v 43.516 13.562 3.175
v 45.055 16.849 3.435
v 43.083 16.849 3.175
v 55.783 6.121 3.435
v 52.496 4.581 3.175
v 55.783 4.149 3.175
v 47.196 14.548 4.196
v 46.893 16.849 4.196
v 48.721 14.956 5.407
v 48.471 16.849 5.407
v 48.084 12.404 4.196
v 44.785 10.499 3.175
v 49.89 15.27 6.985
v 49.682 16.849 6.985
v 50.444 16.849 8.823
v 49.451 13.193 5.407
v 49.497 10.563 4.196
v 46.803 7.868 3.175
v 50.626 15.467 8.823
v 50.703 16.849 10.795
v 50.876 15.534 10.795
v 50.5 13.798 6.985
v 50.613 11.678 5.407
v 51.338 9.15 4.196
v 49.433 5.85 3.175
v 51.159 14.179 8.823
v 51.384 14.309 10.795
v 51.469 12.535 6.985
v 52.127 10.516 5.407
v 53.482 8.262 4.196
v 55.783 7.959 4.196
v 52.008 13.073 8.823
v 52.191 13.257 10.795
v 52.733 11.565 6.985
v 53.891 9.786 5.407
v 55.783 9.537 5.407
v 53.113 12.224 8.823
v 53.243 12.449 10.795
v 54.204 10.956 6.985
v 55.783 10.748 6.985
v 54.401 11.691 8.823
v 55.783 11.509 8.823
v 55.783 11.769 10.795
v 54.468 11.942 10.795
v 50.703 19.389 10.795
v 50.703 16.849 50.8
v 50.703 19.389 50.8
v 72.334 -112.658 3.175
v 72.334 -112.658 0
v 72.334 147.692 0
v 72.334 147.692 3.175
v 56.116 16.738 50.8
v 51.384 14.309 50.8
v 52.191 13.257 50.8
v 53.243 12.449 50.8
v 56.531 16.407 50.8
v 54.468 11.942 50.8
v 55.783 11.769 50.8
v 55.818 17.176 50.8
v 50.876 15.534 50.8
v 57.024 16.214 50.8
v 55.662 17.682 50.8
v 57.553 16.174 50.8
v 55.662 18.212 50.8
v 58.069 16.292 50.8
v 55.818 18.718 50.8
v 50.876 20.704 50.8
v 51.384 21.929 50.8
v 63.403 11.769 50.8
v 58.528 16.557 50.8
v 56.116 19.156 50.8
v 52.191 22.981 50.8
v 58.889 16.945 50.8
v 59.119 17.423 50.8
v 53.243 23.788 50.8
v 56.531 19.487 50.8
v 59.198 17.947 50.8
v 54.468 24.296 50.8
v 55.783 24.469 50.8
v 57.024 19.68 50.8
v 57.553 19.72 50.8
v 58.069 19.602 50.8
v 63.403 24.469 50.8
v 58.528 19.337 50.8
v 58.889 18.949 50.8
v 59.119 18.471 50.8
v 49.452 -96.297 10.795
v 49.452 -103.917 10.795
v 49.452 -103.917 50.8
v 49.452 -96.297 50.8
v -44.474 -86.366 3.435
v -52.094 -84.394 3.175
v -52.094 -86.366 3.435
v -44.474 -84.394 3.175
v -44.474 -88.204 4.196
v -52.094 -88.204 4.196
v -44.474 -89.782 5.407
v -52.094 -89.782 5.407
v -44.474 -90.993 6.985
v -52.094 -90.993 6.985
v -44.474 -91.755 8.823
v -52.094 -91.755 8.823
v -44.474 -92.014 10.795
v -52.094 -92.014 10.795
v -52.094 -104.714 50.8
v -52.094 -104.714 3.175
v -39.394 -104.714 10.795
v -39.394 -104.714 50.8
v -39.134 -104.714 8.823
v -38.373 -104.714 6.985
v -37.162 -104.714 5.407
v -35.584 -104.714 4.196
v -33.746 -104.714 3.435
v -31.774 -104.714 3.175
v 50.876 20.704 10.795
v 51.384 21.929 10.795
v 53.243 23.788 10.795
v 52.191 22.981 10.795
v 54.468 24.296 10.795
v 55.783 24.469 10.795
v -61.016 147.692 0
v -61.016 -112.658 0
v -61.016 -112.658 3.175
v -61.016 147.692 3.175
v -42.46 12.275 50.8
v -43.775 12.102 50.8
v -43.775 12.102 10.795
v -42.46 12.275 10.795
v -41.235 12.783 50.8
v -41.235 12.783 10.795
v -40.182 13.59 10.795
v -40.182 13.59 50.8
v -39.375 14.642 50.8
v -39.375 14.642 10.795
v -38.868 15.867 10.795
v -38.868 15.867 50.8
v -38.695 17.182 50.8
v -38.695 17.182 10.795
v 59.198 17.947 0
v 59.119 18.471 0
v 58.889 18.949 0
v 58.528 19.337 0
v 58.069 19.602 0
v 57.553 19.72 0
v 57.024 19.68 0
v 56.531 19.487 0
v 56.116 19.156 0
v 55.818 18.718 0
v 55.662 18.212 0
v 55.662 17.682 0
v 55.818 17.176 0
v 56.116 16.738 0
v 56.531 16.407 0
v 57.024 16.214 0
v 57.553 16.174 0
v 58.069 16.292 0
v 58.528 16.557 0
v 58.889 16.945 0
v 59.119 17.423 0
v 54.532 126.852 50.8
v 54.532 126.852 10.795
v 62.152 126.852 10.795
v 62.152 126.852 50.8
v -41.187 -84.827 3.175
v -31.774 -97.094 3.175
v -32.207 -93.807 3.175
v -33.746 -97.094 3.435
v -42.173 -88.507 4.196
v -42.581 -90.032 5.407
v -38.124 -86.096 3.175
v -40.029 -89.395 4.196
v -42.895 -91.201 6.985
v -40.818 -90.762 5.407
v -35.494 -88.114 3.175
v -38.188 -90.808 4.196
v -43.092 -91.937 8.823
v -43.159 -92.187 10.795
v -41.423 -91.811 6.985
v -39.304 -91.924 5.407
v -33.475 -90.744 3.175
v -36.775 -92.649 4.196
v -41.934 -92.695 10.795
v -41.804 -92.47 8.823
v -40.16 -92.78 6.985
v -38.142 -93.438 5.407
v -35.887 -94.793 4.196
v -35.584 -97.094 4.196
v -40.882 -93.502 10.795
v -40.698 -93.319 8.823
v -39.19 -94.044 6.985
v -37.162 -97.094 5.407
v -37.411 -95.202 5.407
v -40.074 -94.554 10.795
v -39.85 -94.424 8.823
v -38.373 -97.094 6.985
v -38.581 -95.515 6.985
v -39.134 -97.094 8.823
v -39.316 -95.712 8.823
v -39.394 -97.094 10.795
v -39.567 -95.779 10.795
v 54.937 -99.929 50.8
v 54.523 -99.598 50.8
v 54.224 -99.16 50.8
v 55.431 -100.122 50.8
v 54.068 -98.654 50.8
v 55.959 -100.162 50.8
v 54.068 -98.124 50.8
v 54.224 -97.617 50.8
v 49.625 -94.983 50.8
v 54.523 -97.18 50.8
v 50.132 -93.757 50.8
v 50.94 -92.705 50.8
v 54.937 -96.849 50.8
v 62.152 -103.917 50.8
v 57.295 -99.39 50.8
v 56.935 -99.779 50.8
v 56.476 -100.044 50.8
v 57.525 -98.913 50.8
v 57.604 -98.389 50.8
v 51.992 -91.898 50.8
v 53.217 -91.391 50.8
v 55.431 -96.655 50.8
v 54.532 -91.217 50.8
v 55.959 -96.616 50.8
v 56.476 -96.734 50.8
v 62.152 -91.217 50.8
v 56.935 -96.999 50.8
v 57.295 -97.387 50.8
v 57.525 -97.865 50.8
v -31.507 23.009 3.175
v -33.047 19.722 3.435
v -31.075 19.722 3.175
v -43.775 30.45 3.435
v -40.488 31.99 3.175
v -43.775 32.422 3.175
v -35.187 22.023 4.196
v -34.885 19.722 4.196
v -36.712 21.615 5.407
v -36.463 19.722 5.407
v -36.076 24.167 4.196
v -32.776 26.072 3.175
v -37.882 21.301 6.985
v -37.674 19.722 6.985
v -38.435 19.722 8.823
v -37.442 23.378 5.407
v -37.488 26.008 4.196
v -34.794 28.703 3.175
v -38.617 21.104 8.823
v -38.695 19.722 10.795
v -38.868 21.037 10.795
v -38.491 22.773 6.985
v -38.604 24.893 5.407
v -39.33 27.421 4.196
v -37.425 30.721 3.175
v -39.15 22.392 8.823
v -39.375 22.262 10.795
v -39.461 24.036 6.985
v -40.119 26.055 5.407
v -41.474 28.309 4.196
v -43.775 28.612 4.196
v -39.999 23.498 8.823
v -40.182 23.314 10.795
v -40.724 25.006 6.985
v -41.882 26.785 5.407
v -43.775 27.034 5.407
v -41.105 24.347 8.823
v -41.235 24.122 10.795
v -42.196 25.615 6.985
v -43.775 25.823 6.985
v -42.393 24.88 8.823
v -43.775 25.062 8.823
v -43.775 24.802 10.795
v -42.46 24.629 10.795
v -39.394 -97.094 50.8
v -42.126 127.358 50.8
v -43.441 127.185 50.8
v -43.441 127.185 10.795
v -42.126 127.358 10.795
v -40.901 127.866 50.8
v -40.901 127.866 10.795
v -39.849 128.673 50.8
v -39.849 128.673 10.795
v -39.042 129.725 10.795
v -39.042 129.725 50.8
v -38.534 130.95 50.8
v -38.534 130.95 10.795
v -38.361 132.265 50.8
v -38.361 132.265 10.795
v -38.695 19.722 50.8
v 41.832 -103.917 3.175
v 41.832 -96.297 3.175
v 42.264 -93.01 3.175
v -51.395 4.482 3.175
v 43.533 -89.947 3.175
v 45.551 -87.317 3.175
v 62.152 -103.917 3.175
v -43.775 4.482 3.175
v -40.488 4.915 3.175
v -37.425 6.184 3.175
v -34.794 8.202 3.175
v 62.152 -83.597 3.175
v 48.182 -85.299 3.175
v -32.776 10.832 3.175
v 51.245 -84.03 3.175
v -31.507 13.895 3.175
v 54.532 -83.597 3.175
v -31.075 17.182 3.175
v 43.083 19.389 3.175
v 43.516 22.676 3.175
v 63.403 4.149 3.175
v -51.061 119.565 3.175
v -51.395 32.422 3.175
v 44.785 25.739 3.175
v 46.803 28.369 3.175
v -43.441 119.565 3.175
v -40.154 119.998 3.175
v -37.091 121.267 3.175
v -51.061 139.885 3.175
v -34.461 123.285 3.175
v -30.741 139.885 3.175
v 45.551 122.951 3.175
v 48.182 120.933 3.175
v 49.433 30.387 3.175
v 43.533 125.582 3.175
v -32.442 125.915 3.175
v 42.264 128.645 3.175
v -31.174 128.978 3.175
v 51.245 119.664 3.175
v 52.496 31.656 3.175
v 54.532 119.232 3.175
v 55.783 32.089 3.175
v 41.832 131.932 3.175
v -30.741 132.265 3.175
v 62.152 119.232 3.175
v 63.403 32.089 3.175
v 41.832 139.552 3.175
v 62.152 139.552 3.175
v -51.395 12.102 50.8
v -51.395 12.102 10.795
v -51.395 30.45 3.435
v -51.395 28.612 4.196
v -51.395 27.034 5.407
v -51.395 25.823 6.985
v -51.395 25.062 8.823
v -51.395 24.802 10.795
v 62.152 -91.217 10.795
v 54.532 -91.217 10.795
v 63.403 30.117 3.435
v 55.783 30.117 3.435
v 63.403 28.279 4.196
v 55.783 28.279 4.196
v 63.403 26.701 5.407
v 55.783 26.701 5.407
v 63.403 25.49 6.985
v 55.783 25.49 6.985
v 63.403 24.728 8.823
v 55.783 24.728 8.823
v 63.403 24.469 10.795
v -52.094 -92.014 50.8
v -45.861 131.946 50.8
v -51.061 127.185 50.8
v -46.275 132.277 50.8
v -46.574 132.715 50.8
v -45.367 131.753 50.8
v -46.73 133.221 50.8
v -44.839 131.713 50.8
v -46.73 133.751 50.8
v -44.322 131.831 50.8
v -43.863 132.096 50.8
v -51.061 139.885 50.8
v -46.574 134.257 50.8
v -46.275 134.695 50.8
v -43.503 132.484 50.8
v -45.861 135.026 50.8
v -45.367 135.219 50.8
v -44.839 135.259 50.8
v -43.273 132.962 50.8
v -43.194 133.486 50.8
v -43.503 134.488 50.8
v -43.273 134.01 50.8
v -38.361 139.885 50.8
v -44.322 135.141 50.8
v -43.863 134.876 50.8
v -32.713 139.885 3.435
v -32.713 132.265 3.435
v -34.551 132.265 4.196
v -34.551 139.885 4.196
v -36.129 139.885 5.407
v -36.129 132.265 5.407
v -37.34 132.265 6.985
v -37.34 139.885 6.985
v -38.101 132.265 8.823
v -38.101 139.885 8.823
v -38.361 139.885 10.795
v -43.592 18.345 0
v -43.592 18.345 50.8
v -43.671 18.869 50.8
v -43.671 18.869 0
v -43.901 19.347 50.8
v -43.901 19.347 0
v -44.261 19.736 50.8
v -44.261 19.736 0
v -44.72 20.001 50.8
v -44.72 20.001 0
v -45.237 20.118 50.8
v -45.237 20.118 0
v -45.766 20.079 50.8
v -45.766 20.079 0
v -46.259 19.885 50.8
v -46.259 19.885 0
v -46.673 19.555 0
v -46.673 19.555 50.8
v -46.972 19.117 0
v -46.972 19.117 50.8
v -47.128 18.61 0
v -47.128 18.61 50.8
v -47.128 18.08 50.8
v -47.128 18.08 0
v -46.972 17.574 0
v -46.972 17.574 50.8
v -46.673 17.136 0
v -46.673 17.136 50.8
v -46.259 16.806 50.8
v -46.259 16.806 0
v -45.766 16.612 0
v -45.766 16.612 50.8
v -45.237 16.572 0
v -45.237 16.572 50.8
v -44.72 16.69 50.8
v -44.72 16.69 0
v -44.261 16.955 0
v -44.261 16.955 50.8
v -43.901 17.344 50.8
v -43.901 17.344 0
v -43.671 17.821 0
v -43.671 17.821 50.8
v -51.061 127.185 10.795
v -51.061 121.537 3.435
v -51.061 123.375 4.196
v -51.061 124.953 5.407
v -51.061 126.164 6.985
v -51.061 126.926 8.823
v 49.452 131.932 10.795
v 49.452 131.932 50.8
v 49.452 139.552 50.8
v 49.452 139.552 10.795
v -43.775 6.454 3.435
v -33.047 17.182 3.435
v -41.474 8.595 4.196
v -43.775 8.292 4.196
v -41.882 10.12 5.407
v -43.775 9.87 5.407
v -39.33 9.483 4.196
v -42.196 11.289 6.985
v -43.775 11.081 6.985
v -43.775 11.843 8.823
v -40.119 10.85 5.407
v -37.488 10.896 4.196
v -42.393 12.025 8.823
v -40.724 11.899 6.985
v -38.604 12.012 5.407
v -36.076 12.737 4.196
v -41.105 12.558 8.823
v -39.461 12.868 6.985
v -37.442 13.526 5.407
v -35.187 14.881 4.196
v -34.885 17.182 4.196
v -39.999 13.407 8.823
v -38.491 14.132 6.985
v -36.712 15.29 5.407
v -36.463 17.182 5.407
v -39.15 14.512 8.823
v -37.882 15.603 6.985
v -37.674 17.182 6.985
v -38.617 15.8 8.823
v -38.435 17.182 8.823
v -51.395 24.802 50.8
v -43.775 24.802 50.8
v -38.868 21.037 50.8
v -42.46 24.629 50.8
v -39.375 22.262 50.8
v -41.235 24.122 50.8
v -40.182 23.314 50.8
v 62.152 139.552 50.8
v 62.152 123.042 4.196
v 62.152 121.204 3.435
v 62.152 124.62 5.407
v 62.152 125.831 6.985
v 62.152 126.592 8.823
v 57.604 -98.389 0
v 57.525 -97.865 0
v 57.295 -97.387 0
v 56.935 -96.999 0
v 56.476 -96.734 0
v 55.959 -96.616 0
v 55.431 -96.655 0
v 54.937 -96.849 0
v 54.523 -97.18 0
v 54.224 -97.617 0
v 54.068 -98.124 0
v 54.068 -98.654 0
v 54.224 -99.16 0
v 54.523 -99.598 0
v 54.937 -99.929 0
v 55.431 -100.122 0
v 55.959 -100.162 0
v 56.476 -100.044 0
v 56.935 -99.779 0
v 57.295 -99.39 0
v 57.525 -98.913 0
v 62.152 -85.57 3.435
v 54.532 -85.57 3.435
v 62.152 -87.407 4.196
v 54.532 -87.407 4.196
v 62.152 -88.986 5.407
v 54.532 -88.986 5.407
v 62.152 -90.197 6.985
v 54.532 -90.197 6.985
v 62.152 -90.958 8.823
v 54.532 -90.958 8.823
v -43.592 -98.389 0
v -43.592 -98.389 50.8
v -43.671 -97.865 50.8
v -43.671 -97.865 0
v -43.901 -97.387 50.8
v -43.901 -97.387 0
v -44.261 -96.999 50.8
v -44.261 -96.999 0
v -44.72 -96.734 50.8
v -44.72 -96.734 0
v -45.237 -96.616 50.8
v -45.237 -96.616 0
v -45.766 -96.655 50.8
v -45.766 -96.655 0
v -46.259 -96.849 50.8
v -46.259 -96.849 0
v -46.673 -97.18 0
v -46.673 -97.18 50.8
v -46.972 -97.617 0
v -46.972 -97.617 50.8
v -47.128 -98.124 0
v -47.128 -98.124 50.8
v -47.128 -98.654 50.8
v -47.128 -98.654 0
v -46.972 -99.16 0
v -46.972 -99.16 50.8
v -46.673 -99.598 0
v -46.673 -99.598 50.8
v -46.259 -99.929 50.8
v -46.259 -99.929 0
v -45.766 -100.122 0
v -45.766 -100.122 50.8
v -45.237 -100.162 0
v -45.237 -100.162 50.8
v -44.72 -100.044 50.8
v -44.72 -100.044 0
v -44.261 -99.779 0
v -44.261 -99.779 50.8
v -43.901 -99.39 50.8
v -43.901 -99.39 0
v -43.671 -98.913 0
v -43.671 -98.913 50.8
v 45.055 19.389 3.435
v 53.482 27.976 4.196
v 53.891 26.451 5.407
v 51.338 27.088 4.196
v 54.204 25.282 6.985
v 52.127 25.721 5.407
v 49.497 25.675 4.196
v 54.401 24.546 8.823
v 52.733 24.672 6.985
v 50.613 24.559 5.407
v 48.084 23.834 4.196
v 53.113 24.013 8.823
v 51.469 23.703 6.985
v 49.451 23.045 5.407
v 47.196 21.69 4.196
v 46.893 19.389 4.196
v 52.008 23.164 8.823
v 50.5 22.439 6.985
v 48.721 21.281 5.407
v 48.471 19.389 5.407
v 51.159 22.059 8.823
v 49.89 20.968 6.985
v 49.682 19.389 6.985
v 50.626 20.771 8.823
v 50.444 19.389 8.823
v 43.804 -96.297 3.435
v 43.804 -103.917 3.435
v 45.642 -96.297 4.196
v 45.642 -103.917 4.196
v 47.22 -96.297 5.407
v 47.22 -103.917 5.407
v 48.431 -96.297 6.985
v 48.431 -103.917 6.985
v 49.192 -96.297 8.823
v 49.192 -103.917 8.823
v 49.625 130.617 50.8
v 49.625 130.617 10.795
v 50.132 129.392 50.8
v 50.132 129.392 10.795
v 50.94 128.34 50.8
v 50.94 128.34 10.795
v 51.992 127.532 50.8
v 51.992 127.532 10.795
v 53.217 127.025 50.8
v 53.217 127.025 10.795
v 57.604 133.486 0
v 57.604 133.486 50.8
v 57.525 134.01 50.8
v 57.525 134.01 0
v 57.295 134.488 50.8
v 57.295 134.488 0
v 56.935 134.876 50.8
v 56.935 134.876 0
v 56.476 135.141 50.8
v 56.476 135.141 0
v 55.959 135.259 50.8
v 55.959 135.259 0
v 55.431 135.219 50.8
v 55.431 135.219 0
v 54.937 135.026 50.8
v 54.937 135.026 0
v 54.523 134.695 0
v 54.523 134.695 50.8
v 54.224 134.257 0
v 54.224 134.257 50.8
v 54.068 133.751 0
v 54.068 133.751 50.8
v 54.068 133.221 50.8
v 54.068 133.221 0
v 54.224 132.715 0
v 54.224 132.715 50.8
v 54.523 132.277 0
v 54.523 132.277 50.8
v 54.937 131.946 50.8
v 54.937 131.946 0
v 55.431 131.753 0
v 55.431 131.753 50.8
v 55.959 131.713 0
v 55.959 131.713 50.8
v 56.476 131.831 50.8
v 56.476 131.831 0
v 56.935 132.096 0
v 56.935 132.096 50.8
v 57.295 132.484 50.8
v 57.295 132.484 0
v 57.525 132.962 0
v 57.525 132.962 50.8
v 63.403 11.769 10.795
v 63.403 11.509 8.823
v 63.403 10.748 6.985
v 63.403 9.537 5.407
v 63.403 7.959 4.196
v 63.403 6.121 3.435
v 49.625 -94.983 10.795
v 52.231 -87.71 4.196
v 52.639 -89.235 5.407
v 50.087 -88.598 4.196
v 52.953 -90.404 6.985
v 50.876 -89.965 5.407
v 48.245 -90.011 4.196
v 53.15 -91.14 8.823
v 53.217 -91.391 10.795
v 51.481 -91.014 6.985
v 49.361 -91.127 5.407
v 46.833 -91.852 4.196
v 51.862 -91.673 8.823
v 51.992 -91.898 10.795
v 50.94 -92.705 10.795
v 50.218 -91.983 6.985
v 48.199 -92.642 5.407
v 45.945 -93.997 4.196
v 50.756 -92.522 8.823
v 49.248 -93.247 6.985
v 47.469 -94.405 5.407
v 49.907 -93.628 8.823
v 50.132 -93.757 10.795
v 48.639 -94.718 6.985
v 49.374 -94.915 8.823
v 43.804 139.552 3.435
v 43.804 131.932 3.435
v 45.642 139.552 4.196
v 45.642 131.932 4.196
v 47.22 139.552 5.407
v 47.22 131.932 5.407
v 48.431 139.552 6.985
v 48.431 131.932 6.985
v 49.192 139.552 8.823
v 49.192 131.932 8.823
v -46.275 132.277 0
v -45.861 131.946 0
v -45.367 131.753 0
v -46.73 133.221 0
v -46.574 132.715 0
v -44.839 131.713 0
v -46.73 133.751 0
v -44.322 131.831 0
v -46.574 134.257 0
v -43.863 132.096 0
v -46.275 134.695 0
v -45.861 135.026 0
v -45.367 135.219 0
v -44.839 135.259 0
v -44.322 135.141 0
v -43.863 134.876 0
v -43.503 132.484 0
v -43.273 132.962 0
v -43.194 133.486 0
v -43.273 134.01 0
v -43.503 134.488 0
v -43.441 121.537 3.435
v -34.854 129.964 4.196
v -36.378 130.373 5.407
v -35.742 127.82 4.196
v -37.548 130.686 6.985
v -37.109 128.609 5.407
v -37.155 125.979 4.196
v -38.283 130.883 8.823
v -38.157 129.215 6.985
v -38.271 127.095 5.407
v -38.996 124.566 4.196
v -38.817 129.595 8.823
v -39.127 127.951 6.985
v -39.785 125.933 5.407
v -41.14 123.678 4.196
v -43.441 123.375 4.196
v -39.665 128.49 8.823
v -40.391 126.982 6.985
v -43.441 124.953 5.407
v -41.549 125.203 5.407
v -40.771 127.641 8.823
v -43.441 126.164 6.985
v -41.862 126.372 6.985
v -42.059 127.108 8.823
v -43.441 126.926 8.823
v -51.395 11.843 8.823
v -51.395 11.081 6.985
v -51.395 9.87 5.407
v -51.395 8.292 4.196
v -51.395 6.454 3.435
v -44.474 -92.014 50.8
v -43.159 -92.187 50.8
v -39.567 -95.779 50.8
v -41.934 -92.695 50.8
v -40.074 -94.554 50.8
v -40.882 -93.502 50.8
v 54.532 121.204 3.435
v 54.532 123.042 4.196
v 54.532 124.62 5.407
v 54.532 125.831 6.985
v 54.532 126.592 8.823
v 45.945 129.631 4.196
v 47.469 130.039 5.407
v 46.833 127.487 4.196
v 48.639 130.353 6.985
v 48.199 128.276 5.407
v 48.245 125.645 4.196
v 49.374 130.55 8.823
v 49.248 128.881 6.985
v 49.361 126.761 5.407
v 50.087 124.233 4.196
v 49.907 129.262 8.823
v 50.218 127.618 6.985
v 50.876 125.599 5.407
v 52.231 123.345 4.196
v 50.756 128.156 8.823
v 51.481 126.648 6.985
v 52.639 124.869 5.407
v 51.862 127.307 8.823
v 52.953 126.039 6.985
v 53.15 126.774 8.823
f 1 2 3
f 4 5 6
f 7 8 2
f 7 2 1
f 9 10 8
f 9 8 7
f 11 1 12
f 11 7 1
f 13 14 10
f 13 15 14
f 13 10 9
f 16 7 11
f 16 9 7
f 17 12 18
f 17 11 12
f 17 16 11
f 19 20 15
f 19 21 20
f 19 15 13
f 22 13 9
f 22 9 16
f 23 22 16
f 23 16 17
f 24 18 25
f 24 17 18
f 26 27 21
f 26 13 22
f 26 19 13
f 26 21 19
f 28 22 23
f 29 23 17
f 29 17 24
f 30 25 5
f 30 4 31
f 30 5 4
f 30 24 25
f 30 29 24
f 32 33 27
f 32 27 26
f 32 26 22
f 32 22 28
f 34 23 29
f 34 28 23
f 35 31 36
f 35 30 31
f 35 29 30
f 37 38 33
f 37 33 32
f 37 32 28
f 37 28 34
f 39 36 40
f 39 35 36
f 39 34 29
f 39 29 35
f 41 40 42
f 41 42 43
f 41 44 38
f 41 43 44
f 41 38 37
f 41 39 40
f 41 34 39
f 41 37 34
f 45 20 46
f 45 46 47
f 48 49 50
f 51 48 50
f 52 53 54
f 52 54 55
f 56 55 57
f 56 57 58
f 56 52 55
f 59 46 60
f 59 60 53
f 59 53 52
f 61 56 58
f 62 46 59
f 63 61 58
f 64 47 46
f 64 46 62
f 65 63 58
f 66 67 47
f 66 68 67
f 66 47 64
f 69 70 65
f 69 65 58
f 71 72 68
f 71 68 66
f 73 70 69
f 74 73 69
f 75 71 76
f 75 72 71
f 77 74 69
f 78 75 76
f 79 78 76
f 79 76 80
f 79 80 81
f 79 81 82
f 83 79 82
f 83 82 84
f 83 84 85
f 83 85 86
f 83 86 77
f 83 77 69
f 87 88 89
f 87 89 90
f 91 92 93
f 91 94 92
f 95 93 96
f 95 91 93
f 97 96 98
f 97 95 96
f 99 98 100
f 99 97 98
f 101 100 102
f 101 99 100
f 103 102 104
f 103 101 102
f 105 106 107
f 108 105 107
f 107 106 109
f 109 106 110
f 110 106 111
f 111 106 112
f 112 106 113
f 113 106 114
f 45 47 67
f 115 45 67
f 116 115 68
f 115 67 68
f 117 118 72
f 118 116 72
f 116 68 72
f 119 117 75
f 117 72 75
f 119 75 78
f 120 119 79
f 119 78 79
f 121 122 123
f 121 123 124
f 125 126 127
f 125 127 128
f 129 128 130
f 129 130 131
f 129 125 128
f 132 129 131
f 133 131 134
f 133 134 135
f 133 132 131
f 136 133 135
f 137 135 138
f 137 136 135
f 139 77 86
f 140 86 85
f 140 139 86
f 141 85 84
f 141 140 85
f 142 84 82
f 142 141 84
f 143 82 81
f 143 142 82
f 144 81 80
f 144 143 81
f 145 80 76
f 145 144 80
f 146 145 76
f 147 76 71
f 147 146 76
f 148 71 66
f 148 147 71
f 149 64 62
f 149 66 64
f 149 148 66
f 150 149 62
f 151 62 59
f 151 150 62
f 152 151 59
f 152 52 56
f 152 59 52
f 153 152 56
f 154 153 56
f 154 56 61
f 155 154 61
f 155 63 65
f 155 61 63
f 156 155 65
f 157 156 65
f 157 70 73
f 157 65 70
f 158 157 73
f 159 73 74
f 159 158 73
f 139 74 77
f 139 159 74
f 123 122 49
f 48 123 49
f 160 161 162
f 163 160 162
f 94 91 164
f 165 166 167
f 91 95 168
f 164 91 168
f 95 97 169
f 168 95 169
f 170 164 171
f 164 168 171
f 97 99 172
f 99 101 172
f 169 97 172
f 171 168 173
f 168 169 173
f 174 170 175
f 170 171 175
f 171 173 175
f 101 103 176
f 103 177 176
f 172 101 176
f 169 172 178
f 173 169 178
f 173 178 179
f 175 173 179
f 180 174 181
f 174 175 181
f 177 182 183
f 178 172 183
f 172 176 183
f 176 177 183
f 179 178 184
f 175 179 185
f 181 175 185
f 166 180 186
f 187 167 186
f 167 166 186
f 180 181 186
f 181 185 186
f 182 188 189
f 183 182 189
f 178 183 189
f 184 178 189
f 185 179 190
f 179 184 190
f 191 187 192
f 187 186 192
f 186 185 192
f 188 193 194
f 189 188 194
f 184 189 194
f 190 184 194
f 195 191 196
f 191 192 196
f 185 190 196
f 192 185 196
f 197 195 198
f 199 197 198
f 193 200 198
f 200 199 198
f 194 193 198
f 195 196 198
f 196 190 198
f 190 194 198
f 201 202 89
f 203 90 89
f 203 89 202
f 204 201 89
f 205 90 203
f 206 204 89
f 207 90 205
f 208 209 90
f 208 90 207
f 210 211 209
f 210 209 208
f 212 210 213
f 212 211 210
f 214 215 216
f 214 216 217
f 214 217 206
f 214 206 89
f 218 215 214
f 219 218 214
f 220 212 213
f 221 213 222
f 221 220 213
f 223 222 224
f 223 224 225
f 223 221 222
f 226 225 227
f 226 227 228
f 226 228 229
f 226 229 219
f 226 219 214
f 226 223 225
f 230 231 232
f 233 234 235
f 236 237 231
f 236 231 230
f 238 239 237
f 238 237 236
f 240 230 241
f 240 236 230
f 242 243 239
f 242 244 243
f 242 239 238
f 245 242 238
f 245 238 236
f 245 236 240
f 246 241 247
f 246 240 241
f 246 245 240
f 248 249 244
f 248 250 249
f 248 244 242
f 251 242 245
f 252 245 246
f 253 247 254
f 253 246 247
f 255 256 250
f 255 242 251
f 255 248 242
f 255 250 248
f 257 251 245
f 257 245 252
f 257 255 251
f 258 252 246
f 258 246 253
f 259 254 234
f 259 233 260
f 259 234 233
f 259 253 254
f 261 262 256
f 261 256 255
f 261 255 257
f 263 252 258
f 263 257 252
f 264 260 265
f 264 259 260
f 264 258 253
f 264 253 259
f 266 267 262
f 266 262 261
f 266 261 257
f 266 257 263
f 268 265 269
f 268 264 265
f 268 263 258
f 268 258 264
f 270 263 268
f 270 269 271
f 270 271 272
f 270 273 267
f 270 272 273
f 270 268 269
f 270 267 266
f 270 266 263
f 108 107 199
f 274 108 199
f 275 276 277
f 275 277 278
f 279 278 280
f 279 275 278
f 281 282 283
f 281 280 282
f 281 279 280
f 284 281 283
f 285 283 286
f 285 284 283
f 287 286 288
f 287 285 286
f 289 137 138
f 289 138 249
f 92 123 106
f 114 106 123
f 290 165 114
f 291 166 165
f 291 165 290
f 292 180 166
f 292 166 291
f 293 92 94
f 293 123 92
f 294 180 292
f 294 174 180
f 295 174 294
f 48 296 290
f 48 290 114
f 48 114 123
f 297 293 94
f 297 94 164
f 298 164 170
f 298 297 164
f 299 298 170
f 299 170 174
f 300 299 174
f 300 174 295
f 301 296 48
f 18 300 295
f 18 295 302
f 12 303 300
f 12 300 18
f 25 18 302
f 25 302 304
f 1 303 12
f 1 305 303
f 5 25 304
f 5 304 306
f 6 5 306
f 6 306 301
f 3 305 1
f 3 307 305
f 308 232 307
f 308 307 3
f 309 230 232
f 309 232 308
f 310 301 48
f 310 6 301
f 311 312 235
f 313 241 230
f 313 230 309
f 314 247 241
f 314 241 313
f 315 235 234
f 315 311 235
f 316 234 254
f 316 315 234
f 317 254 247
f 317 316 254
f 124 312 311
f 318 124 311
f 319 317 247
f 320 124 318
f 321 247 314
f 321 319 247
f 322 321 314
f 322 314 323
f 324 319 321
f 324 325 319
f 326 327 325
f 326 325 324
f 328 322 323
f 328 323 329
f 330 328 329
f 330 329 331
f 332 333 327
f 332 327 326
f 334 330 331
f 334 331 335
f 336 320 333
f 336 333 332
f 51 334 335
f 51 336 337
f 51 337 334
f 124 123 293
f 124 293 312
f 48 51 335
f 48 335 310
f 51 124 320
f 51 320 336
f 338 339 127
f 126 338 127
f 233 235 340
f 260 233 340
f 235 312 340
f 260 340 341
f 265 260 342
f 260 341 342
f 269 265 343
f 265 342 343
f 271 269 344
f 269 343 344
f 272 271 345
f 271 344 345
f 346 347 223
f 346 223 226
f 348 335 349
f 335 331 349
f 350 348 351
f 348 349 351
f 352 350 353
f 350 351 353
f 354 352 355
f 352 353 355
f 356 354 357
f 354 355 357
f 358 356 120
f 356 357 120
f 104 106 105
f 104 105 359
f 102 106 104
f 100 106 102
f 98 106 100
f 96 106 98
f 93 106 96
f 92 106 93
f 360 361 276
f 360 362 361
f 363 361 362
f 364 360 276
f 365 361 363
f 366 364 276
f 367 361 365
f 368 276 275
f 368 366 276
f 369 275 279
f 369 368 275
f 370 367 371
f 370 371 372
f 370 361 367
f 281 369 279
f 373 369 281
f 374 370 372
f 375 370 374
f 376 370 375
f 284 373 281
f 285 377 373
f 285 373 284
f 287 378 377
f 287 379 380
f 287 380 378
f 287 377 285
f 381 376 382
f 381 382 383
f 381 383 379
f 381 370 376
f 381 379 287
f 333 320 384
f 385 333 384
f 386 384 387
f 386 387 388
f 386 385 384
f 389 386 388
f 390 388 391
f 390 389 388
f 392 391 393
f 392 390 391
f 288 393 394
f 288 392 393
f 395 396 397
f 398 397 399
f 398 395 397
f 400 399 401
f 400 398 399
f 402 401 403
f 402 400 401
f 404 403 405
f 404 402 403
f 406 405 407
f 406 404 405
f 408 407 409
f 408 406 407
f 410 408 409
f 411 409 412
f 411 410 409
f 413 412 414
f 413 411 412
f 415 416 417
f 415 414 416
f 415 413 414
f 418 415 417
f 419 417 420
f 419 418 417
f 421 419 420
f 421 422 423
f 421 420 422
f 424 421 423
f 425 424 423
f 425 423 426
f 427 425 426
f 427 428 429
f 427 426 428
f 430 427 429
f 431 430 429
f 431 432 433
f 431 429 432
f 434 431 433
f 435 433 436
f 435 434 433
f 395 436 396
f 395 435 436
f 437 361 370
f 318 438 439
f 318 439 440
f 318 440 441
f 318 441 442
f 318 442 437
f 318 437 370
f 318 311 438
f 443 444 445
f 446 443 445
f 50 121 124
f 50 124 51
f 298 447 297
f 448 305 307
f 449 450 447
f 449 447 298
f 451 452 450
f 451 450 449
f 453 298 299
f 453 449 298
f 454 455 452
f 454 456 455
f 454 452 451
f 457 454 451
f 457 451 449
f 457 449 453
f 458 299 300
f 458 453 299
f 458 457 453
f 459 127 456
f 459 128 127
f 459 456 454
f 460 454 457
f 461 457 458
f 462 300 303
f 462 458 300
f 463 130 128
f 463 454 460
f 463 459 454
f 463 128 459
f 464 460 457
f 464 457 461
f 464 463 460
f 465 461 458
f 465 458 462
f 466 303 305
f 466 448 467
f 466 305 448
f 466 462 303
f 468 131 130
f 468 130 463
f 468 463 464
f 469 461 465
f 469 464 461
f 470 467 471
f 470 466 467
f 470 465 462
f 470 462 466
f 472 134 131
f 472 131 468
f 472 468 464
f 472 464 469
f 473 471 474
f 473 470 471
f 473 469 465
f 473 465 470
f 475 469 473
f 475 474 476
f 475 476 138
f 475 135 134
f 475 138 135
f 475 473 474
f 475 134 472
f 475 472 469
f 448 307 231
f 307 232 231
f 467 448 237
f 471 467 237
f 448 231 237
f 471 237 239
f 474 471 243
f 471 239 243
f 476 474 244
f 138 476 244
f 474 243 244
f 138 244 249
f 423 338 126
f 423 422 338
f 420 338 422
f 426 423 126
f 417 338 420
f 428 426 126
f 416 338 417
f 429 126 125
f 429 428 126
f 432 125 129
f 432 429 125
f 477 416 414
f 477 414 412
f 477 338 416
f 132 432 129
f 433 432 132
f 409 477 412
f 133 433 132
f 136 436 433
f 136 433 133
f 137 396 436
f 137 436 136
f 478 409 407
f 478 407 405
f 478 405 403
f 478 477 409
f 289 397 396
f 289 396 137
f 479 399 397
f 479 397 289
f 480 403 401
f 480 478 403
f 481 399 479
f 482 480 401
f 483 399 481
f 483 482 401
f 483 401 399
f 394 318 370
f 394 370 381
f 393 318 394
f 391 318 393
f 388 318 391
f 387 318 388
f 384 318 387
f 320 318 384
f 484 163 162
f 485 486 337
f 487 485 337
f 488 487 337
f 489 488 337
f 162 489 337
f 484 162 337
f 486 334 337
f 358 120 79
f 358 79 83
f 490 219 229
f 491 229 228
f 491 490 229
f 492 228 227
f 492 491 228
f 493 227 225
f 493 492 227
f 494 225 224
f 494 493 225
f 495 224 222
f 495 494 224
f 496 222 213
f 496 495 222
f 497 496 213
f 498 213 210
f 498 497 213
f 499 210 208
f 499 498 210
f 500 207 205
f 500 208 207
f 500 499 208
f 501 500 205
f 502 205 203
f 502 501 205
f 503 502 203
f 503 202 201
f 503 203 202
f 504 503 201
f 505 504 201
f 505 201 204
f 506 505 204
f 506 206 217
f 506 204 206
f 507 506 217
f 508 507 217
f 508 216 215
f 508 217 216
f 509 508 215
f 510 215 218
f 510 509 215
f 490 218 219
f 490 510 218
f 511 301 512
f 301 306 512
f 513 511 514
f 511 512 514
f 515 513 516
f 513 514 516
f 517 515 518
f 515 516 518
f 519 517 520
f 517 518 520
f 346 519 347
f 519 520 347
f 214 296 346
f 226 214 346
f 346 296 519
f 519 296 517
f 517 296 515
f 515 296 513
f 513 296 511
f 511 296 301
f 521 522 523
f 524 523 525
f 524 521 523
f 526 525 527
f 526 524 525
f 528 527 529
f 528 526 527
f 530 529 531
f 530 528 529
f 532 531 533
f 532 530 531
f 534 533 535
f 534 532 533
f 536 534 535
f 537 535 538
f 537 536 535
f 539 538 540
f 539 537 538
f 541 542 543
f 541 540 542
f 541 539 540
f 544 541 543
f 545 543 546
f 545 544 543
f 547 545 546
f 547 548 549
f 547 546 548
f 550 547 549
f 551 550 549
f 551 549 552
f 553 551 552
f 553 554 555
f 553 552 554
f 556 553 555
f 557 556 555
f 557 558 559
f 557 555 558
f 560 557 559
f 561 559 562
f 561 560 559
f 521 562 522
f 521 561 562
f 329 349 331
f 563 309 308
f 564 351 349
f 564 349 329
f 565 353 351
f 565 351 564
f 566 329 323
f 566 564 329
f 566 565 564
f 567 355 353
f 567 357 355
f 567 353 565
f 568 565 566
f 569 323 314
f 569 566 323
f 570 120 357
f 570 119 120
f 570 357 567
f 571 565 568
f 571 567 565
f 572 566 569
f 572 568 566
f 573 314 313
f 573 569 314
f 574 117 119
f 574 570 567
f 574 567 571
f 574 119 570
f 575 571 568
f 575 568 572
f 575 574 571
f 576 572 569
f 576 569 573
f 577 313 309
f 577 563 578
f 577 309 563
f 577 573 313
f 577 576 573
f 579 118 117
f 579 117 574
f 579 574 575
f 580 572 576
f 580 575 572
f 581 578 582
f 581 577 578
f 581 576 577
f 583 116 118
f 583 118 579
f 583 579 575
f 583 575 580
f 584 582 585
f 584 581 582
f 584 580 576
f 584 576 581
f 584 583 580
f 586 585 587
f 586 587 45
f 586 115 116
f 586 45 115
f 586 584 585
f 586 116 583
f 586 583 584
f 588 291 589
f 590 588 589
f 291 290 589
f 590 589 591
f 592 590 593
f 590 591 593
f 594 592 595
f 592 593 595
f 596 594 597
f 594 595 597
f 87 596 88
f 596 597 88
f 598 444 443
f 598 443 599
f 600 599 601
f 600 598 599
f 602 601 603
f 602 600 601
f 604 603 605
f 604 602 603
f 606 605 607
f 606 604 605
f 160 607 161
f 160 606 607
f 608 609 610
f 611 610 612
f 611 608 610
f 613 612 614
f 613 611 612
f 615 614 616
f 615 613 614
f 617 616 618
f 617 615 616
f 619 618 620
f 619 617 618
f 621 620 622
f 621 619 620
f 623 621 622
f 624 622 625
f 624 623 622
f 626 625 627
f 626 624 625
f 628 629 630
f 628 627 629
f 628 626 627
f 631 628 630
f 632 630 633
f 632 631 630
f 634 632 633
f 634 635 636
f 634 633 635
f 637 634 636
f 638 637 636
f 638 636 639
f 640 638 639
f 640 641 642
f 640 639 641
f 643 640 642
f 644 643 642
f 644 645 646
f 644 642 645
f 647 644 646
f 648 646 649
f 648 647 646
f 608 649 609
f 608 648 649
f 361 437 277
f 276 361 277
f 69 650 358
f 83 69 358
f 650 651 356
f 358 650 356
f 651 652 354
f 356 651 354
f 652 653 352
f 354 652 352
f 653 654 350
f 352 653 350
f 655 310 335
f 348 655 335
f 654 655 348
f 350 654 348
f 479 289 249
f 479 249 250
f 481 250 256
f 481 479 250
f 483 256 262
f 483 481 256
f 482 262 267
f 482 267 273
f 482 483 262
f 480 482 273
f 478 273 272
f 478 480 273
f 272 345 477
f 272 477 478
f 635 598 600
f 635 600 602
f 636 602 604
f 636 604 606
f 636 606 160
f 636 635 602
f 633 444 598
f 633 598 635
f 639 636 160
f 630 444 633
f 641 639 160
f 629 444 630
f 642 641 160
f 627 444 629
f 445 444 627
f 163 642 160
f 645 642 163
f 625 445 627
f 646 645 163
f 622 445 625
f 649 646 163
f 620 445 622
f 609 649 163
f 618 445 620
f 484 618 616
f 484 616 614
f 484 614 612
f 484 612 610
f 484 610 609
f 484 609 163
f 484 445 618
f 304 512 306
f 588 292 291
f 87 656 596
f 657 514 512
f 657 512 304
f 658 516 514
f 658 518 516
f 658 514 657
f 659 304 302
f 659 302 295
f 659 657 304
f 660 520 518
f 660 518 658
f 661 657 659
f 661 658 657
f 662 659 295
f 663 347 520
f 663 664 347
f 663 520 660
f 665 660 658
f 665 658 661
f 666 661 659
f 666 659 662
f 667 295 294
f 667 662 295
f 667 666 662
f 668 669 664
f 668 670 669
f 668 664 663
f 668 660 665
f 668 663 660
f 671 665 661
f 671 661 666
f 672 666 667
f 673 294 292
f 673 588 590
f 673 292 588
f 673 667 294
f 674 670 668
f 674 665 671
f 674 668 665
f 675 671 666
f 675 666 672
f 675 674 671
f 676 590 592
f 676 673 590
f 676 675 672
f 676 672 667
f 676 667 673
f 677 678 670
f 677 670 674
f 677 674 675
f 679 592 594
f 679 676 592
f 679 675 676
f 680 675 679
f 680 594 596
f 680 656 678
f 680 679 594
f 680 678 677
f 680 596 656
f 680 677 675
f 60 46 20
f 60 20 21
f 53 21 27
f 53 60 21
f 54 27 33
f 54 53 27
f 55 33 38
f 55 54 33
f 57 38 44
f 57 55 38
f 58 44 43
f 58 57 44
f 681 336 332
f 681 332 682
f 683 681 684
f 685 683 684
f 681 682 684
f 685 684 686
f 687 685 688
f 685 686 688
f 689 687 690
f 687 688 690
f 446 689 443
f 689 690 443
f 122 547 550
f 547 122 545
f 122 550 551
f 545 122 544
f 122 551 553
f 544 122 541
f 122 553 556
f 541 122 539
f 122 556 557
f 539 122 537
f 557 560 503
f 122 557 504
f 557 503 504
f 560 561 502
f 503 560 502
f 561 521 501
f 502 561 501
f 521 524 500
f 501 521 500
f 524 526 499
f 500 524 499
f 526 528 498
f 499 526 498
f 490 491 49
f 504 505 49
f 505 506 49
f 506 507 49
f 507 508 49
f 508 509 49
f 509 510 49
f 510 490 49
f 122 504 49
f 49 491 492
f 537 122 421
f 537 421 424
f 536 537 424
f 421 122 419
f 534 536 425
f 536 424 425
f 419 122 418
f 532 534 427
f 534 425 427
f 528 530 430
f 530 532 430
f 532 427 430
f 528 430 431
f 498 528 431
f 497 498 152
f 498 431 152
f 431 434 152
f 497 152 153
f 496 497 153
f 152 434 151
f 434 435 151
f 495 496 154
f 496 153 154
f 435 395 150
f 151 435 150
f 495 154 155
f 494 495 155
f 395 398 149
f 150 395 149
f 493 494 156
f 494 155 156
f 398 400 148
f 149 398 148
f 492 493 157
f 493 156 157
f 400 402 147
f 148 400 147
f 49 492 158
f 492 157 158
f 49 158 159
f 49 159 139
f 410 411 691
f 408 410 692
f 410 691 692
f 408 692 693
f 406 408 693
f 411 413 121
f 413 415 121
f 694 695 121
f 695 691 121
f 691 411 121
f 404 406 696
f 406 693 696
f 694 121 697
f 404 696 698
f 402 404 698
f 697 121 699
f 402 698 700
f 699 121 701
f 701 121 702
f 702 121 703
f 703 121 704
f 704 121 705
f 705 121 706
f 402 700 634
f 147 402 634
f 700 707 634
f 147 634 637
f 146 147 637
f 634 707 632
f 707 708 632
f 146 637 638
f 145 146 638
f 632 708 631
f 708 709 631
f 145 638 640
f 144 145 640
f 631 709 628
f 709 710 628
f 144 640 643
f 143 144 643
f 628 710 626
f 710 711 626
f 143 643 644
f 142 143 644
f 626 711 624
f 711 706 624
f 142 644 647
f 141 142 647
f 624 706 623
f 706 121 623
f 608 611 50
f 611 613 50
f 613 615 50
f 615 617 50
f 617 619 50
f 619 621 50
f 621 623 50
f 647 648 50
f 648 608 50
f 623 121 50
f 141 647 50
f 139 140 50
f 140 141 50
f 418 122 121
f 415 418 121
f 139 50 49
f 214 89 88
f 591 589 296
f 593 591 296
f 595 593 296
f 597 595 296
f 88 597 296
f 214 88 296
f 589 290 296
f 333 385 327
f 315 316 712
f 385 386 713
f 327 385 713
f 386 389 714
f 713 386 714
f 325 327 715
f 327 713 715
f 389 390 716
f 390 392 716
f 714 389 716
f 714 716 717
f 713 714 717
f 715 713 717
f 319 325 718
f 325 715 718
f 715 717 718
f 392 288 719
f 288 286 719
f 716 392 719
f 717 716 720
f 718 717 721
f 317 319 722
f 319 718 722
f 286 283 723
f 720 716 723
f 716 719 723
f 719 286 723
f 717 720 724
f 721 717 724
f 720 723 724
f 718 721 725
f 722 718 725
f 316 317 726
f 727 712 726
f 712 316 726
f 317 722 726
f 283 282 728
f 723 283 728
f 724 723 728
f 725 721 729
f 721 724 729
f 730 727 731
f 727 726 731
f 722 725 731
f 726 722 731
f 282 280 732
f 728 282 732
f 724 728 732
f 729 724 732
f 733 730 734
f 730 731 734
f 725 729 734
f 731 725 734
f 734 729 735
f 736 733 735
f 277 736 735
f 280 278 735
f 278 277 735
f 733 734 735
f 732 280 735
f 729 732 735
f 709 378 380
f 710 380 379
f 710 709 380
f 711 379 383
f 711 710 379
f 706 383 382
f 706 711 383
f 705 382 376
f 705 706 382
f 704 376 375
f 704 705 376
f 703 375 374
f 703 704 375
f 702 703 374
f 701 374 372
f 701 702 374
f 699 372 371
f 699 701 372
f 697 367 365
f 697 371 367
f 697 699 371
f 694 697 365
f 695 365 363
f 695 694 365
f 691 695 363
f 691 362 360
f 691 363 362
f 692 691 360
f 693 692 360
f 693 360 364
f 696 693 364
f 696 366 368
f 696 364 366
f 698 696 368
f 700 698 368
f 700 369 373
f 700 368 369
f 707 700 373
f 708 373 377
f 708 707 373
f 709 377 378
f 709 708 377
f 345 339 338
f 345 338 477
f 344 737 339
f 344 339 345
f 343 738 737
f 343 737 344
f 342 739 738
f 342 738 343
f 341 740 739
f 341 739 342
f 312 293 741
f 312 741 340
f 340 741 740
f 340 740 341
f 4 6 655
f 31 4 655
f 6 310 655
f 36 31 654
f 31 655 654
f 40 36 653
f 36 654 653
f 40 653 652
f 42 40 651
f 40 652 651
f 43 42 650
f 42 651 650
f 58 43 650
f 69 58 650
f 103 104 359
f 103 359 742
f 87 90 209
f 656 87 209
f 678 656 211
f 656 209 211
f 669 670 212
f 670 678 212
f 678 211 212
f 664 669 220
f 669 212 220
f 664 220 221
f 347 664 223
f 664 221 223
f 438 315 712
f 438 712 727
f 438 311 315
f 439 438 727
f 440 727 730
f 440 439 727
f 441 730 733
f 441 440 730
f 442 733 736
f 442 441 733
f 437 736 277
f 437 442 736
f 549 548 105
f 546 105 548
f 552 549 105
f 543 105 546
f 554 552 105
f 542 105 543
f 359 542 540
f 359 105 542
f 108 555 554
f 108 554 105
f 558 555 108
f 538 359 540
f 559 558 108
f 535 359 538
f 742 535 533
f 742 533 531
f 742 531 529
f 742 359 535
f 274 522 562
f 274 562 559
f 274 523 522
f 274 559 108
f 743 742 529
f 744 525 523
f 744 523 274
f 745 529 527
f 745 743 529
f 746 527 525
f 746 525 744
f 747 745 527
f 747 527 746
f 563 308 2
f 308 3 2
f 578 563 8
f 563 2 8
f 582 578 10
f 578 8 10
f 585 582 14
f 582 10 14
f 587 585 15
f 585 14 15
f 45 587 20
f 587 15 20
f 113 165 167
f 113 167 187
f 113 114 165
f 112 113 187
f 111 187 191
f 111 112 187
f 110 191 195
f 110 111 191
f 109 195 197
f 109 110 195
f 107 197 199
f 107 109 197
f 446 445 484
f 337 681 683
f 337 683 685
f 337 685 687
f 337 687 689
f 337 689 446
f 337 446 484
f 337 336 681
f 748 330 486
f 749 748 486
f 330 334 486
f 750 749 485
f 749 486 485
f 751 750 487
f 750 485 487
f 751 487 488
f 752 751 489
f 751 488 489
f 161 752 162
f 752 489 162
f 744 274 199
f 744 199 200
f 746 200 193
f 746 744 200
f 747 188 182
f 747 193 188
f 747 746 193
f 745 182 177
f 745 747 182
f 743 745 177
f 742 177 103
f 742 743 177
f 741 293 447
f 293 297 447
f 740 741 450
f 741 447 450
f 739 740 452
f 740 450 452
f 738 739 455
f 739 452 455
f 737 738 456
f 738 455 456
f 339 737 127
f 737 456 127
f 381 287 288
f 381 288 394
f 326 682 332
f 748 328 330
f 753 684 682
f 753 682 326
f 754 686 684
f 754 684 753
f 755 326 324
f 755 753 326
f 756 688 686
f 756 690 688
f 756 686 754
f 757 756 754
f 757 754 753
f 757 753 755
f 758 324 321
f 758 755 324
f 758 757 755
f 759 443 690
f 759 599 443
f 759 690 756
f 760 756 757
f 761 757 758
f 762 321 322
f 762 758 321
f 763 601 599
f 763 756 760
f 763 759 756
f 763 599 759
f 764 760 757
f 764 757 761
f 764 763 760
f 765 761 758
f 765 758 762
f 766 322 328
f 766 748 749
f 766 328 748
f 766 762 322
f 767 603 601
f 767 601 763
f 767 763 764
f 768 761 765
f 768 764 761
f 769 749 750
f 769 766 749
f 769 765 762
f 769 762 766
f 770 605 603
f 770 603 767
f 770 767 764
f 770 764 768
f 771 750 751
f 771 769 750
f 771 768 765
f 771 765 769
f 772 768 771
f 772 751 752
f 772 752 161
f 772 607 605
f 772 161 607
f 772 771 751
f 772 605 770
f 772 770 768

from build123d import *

# Parameters (mm, degrees)
F0_W     = 133.35
F0_H     = 260.35
F1_DEPTH = 3.175
F2_W     = 12.7
F2_H     = 12.7
F3_DEPTH = 50.8
F4_R     = 1.778
F5_DEPTH = 101.6
F6_R     = 5.08
F7_R     = 7.62


with BuildPart() as f1:
    # F0 (on Top) → F1 (new body)
    with BuildSketch(Plane.XY):
        with Locations((5.6592430919, 17.5170571296)):
            Rectangle(F0_W, F0_H)
    extrude(amount=F1_DEPTH)

    # F2 (on Top) → F3 (join)
    with BuildSketch(Plane.XY):
        with Locations((-44.7109719574, 133.5352105856)):
            Rectangle(F2_W, F2_H)
        with Locations((55.8016305625, 133.2016480923)):
            Rectangle(F2_W, F2_H)
        with Locations((55.8016305625, -97.5674582481)):
            Rectangle(F2_W, F2_H)
        with Locations((-45.7438980997, -98.3642829418)):
            Rectangle(F2_W, F2_H)
        with Locations((57.053201443, 18.1187247694)):
            Rectangle(F2_W, F2_H)
        with Locations((-45.0445456266, 18.4522984385)):
            Rectangle(F2_W, F2_H)
    extrude(amount=F3_DEPTH)

    # F4 (on Top) → F5 (cut)
    with BuildSketch(Plane.XY):
        with Locations((-44.9716448784, 133.486032486)):
            Circle(F4_R)
        with Locations((55.8261945844, 133.486032486)):
            Circle(F4_R)
        with Locations((-45.3700572252, 18.3454081416)):
            Circle(F4_R)
        with Locations((57.4198365211, 17.9469976574)):
            Circle(F4_R)
        with Locations((-45.3700572252, -98.3888506889)):
            Circle(F4_R)
        with Locations((55.8261945844, -98.3888506889)):
            Circle(F4_R)
    extrude(amount=F5_DEPTH, mode=Mode.SUBTRACT)

    # F6
    f6_edges = [f1.edges().sort_by_distance(p)[0] for p in [
        (-38.360972, 127.185211, 26.9875),
        (-38.694546, 24.802298, 26.9875),
        (-38.694546, 12.102298, 26.9875),
        (-39.393898, -92.014283, 26.9875),
        (49.451631, 126.851648, 26.9875),
        (50.703201, 24.468725, 26.9875),
        (49.451631, -91.217458, 26.9875),
        (50.703201, 11.768725, 26.9875),
    ]]
    fillet(f6_edges, radius=F6_R)

    # F7
    f7_edges = [f1.edges().sort_by_distance(p)[0] for p in [
        (-47.250972, 127.185211, 3.175),
        (50.939528, 128.339546, 3.175),
        (-40.182443, 13.590196, 3.175),
        (52.191099, 13.256622, 3.175),
        (-39.393898, -100.904283, 3.175),
        (49.451631, -100.107458, 3.175),
    ]]
    fillet(f7_edges, radius=F7_R)


solid = f1.part
